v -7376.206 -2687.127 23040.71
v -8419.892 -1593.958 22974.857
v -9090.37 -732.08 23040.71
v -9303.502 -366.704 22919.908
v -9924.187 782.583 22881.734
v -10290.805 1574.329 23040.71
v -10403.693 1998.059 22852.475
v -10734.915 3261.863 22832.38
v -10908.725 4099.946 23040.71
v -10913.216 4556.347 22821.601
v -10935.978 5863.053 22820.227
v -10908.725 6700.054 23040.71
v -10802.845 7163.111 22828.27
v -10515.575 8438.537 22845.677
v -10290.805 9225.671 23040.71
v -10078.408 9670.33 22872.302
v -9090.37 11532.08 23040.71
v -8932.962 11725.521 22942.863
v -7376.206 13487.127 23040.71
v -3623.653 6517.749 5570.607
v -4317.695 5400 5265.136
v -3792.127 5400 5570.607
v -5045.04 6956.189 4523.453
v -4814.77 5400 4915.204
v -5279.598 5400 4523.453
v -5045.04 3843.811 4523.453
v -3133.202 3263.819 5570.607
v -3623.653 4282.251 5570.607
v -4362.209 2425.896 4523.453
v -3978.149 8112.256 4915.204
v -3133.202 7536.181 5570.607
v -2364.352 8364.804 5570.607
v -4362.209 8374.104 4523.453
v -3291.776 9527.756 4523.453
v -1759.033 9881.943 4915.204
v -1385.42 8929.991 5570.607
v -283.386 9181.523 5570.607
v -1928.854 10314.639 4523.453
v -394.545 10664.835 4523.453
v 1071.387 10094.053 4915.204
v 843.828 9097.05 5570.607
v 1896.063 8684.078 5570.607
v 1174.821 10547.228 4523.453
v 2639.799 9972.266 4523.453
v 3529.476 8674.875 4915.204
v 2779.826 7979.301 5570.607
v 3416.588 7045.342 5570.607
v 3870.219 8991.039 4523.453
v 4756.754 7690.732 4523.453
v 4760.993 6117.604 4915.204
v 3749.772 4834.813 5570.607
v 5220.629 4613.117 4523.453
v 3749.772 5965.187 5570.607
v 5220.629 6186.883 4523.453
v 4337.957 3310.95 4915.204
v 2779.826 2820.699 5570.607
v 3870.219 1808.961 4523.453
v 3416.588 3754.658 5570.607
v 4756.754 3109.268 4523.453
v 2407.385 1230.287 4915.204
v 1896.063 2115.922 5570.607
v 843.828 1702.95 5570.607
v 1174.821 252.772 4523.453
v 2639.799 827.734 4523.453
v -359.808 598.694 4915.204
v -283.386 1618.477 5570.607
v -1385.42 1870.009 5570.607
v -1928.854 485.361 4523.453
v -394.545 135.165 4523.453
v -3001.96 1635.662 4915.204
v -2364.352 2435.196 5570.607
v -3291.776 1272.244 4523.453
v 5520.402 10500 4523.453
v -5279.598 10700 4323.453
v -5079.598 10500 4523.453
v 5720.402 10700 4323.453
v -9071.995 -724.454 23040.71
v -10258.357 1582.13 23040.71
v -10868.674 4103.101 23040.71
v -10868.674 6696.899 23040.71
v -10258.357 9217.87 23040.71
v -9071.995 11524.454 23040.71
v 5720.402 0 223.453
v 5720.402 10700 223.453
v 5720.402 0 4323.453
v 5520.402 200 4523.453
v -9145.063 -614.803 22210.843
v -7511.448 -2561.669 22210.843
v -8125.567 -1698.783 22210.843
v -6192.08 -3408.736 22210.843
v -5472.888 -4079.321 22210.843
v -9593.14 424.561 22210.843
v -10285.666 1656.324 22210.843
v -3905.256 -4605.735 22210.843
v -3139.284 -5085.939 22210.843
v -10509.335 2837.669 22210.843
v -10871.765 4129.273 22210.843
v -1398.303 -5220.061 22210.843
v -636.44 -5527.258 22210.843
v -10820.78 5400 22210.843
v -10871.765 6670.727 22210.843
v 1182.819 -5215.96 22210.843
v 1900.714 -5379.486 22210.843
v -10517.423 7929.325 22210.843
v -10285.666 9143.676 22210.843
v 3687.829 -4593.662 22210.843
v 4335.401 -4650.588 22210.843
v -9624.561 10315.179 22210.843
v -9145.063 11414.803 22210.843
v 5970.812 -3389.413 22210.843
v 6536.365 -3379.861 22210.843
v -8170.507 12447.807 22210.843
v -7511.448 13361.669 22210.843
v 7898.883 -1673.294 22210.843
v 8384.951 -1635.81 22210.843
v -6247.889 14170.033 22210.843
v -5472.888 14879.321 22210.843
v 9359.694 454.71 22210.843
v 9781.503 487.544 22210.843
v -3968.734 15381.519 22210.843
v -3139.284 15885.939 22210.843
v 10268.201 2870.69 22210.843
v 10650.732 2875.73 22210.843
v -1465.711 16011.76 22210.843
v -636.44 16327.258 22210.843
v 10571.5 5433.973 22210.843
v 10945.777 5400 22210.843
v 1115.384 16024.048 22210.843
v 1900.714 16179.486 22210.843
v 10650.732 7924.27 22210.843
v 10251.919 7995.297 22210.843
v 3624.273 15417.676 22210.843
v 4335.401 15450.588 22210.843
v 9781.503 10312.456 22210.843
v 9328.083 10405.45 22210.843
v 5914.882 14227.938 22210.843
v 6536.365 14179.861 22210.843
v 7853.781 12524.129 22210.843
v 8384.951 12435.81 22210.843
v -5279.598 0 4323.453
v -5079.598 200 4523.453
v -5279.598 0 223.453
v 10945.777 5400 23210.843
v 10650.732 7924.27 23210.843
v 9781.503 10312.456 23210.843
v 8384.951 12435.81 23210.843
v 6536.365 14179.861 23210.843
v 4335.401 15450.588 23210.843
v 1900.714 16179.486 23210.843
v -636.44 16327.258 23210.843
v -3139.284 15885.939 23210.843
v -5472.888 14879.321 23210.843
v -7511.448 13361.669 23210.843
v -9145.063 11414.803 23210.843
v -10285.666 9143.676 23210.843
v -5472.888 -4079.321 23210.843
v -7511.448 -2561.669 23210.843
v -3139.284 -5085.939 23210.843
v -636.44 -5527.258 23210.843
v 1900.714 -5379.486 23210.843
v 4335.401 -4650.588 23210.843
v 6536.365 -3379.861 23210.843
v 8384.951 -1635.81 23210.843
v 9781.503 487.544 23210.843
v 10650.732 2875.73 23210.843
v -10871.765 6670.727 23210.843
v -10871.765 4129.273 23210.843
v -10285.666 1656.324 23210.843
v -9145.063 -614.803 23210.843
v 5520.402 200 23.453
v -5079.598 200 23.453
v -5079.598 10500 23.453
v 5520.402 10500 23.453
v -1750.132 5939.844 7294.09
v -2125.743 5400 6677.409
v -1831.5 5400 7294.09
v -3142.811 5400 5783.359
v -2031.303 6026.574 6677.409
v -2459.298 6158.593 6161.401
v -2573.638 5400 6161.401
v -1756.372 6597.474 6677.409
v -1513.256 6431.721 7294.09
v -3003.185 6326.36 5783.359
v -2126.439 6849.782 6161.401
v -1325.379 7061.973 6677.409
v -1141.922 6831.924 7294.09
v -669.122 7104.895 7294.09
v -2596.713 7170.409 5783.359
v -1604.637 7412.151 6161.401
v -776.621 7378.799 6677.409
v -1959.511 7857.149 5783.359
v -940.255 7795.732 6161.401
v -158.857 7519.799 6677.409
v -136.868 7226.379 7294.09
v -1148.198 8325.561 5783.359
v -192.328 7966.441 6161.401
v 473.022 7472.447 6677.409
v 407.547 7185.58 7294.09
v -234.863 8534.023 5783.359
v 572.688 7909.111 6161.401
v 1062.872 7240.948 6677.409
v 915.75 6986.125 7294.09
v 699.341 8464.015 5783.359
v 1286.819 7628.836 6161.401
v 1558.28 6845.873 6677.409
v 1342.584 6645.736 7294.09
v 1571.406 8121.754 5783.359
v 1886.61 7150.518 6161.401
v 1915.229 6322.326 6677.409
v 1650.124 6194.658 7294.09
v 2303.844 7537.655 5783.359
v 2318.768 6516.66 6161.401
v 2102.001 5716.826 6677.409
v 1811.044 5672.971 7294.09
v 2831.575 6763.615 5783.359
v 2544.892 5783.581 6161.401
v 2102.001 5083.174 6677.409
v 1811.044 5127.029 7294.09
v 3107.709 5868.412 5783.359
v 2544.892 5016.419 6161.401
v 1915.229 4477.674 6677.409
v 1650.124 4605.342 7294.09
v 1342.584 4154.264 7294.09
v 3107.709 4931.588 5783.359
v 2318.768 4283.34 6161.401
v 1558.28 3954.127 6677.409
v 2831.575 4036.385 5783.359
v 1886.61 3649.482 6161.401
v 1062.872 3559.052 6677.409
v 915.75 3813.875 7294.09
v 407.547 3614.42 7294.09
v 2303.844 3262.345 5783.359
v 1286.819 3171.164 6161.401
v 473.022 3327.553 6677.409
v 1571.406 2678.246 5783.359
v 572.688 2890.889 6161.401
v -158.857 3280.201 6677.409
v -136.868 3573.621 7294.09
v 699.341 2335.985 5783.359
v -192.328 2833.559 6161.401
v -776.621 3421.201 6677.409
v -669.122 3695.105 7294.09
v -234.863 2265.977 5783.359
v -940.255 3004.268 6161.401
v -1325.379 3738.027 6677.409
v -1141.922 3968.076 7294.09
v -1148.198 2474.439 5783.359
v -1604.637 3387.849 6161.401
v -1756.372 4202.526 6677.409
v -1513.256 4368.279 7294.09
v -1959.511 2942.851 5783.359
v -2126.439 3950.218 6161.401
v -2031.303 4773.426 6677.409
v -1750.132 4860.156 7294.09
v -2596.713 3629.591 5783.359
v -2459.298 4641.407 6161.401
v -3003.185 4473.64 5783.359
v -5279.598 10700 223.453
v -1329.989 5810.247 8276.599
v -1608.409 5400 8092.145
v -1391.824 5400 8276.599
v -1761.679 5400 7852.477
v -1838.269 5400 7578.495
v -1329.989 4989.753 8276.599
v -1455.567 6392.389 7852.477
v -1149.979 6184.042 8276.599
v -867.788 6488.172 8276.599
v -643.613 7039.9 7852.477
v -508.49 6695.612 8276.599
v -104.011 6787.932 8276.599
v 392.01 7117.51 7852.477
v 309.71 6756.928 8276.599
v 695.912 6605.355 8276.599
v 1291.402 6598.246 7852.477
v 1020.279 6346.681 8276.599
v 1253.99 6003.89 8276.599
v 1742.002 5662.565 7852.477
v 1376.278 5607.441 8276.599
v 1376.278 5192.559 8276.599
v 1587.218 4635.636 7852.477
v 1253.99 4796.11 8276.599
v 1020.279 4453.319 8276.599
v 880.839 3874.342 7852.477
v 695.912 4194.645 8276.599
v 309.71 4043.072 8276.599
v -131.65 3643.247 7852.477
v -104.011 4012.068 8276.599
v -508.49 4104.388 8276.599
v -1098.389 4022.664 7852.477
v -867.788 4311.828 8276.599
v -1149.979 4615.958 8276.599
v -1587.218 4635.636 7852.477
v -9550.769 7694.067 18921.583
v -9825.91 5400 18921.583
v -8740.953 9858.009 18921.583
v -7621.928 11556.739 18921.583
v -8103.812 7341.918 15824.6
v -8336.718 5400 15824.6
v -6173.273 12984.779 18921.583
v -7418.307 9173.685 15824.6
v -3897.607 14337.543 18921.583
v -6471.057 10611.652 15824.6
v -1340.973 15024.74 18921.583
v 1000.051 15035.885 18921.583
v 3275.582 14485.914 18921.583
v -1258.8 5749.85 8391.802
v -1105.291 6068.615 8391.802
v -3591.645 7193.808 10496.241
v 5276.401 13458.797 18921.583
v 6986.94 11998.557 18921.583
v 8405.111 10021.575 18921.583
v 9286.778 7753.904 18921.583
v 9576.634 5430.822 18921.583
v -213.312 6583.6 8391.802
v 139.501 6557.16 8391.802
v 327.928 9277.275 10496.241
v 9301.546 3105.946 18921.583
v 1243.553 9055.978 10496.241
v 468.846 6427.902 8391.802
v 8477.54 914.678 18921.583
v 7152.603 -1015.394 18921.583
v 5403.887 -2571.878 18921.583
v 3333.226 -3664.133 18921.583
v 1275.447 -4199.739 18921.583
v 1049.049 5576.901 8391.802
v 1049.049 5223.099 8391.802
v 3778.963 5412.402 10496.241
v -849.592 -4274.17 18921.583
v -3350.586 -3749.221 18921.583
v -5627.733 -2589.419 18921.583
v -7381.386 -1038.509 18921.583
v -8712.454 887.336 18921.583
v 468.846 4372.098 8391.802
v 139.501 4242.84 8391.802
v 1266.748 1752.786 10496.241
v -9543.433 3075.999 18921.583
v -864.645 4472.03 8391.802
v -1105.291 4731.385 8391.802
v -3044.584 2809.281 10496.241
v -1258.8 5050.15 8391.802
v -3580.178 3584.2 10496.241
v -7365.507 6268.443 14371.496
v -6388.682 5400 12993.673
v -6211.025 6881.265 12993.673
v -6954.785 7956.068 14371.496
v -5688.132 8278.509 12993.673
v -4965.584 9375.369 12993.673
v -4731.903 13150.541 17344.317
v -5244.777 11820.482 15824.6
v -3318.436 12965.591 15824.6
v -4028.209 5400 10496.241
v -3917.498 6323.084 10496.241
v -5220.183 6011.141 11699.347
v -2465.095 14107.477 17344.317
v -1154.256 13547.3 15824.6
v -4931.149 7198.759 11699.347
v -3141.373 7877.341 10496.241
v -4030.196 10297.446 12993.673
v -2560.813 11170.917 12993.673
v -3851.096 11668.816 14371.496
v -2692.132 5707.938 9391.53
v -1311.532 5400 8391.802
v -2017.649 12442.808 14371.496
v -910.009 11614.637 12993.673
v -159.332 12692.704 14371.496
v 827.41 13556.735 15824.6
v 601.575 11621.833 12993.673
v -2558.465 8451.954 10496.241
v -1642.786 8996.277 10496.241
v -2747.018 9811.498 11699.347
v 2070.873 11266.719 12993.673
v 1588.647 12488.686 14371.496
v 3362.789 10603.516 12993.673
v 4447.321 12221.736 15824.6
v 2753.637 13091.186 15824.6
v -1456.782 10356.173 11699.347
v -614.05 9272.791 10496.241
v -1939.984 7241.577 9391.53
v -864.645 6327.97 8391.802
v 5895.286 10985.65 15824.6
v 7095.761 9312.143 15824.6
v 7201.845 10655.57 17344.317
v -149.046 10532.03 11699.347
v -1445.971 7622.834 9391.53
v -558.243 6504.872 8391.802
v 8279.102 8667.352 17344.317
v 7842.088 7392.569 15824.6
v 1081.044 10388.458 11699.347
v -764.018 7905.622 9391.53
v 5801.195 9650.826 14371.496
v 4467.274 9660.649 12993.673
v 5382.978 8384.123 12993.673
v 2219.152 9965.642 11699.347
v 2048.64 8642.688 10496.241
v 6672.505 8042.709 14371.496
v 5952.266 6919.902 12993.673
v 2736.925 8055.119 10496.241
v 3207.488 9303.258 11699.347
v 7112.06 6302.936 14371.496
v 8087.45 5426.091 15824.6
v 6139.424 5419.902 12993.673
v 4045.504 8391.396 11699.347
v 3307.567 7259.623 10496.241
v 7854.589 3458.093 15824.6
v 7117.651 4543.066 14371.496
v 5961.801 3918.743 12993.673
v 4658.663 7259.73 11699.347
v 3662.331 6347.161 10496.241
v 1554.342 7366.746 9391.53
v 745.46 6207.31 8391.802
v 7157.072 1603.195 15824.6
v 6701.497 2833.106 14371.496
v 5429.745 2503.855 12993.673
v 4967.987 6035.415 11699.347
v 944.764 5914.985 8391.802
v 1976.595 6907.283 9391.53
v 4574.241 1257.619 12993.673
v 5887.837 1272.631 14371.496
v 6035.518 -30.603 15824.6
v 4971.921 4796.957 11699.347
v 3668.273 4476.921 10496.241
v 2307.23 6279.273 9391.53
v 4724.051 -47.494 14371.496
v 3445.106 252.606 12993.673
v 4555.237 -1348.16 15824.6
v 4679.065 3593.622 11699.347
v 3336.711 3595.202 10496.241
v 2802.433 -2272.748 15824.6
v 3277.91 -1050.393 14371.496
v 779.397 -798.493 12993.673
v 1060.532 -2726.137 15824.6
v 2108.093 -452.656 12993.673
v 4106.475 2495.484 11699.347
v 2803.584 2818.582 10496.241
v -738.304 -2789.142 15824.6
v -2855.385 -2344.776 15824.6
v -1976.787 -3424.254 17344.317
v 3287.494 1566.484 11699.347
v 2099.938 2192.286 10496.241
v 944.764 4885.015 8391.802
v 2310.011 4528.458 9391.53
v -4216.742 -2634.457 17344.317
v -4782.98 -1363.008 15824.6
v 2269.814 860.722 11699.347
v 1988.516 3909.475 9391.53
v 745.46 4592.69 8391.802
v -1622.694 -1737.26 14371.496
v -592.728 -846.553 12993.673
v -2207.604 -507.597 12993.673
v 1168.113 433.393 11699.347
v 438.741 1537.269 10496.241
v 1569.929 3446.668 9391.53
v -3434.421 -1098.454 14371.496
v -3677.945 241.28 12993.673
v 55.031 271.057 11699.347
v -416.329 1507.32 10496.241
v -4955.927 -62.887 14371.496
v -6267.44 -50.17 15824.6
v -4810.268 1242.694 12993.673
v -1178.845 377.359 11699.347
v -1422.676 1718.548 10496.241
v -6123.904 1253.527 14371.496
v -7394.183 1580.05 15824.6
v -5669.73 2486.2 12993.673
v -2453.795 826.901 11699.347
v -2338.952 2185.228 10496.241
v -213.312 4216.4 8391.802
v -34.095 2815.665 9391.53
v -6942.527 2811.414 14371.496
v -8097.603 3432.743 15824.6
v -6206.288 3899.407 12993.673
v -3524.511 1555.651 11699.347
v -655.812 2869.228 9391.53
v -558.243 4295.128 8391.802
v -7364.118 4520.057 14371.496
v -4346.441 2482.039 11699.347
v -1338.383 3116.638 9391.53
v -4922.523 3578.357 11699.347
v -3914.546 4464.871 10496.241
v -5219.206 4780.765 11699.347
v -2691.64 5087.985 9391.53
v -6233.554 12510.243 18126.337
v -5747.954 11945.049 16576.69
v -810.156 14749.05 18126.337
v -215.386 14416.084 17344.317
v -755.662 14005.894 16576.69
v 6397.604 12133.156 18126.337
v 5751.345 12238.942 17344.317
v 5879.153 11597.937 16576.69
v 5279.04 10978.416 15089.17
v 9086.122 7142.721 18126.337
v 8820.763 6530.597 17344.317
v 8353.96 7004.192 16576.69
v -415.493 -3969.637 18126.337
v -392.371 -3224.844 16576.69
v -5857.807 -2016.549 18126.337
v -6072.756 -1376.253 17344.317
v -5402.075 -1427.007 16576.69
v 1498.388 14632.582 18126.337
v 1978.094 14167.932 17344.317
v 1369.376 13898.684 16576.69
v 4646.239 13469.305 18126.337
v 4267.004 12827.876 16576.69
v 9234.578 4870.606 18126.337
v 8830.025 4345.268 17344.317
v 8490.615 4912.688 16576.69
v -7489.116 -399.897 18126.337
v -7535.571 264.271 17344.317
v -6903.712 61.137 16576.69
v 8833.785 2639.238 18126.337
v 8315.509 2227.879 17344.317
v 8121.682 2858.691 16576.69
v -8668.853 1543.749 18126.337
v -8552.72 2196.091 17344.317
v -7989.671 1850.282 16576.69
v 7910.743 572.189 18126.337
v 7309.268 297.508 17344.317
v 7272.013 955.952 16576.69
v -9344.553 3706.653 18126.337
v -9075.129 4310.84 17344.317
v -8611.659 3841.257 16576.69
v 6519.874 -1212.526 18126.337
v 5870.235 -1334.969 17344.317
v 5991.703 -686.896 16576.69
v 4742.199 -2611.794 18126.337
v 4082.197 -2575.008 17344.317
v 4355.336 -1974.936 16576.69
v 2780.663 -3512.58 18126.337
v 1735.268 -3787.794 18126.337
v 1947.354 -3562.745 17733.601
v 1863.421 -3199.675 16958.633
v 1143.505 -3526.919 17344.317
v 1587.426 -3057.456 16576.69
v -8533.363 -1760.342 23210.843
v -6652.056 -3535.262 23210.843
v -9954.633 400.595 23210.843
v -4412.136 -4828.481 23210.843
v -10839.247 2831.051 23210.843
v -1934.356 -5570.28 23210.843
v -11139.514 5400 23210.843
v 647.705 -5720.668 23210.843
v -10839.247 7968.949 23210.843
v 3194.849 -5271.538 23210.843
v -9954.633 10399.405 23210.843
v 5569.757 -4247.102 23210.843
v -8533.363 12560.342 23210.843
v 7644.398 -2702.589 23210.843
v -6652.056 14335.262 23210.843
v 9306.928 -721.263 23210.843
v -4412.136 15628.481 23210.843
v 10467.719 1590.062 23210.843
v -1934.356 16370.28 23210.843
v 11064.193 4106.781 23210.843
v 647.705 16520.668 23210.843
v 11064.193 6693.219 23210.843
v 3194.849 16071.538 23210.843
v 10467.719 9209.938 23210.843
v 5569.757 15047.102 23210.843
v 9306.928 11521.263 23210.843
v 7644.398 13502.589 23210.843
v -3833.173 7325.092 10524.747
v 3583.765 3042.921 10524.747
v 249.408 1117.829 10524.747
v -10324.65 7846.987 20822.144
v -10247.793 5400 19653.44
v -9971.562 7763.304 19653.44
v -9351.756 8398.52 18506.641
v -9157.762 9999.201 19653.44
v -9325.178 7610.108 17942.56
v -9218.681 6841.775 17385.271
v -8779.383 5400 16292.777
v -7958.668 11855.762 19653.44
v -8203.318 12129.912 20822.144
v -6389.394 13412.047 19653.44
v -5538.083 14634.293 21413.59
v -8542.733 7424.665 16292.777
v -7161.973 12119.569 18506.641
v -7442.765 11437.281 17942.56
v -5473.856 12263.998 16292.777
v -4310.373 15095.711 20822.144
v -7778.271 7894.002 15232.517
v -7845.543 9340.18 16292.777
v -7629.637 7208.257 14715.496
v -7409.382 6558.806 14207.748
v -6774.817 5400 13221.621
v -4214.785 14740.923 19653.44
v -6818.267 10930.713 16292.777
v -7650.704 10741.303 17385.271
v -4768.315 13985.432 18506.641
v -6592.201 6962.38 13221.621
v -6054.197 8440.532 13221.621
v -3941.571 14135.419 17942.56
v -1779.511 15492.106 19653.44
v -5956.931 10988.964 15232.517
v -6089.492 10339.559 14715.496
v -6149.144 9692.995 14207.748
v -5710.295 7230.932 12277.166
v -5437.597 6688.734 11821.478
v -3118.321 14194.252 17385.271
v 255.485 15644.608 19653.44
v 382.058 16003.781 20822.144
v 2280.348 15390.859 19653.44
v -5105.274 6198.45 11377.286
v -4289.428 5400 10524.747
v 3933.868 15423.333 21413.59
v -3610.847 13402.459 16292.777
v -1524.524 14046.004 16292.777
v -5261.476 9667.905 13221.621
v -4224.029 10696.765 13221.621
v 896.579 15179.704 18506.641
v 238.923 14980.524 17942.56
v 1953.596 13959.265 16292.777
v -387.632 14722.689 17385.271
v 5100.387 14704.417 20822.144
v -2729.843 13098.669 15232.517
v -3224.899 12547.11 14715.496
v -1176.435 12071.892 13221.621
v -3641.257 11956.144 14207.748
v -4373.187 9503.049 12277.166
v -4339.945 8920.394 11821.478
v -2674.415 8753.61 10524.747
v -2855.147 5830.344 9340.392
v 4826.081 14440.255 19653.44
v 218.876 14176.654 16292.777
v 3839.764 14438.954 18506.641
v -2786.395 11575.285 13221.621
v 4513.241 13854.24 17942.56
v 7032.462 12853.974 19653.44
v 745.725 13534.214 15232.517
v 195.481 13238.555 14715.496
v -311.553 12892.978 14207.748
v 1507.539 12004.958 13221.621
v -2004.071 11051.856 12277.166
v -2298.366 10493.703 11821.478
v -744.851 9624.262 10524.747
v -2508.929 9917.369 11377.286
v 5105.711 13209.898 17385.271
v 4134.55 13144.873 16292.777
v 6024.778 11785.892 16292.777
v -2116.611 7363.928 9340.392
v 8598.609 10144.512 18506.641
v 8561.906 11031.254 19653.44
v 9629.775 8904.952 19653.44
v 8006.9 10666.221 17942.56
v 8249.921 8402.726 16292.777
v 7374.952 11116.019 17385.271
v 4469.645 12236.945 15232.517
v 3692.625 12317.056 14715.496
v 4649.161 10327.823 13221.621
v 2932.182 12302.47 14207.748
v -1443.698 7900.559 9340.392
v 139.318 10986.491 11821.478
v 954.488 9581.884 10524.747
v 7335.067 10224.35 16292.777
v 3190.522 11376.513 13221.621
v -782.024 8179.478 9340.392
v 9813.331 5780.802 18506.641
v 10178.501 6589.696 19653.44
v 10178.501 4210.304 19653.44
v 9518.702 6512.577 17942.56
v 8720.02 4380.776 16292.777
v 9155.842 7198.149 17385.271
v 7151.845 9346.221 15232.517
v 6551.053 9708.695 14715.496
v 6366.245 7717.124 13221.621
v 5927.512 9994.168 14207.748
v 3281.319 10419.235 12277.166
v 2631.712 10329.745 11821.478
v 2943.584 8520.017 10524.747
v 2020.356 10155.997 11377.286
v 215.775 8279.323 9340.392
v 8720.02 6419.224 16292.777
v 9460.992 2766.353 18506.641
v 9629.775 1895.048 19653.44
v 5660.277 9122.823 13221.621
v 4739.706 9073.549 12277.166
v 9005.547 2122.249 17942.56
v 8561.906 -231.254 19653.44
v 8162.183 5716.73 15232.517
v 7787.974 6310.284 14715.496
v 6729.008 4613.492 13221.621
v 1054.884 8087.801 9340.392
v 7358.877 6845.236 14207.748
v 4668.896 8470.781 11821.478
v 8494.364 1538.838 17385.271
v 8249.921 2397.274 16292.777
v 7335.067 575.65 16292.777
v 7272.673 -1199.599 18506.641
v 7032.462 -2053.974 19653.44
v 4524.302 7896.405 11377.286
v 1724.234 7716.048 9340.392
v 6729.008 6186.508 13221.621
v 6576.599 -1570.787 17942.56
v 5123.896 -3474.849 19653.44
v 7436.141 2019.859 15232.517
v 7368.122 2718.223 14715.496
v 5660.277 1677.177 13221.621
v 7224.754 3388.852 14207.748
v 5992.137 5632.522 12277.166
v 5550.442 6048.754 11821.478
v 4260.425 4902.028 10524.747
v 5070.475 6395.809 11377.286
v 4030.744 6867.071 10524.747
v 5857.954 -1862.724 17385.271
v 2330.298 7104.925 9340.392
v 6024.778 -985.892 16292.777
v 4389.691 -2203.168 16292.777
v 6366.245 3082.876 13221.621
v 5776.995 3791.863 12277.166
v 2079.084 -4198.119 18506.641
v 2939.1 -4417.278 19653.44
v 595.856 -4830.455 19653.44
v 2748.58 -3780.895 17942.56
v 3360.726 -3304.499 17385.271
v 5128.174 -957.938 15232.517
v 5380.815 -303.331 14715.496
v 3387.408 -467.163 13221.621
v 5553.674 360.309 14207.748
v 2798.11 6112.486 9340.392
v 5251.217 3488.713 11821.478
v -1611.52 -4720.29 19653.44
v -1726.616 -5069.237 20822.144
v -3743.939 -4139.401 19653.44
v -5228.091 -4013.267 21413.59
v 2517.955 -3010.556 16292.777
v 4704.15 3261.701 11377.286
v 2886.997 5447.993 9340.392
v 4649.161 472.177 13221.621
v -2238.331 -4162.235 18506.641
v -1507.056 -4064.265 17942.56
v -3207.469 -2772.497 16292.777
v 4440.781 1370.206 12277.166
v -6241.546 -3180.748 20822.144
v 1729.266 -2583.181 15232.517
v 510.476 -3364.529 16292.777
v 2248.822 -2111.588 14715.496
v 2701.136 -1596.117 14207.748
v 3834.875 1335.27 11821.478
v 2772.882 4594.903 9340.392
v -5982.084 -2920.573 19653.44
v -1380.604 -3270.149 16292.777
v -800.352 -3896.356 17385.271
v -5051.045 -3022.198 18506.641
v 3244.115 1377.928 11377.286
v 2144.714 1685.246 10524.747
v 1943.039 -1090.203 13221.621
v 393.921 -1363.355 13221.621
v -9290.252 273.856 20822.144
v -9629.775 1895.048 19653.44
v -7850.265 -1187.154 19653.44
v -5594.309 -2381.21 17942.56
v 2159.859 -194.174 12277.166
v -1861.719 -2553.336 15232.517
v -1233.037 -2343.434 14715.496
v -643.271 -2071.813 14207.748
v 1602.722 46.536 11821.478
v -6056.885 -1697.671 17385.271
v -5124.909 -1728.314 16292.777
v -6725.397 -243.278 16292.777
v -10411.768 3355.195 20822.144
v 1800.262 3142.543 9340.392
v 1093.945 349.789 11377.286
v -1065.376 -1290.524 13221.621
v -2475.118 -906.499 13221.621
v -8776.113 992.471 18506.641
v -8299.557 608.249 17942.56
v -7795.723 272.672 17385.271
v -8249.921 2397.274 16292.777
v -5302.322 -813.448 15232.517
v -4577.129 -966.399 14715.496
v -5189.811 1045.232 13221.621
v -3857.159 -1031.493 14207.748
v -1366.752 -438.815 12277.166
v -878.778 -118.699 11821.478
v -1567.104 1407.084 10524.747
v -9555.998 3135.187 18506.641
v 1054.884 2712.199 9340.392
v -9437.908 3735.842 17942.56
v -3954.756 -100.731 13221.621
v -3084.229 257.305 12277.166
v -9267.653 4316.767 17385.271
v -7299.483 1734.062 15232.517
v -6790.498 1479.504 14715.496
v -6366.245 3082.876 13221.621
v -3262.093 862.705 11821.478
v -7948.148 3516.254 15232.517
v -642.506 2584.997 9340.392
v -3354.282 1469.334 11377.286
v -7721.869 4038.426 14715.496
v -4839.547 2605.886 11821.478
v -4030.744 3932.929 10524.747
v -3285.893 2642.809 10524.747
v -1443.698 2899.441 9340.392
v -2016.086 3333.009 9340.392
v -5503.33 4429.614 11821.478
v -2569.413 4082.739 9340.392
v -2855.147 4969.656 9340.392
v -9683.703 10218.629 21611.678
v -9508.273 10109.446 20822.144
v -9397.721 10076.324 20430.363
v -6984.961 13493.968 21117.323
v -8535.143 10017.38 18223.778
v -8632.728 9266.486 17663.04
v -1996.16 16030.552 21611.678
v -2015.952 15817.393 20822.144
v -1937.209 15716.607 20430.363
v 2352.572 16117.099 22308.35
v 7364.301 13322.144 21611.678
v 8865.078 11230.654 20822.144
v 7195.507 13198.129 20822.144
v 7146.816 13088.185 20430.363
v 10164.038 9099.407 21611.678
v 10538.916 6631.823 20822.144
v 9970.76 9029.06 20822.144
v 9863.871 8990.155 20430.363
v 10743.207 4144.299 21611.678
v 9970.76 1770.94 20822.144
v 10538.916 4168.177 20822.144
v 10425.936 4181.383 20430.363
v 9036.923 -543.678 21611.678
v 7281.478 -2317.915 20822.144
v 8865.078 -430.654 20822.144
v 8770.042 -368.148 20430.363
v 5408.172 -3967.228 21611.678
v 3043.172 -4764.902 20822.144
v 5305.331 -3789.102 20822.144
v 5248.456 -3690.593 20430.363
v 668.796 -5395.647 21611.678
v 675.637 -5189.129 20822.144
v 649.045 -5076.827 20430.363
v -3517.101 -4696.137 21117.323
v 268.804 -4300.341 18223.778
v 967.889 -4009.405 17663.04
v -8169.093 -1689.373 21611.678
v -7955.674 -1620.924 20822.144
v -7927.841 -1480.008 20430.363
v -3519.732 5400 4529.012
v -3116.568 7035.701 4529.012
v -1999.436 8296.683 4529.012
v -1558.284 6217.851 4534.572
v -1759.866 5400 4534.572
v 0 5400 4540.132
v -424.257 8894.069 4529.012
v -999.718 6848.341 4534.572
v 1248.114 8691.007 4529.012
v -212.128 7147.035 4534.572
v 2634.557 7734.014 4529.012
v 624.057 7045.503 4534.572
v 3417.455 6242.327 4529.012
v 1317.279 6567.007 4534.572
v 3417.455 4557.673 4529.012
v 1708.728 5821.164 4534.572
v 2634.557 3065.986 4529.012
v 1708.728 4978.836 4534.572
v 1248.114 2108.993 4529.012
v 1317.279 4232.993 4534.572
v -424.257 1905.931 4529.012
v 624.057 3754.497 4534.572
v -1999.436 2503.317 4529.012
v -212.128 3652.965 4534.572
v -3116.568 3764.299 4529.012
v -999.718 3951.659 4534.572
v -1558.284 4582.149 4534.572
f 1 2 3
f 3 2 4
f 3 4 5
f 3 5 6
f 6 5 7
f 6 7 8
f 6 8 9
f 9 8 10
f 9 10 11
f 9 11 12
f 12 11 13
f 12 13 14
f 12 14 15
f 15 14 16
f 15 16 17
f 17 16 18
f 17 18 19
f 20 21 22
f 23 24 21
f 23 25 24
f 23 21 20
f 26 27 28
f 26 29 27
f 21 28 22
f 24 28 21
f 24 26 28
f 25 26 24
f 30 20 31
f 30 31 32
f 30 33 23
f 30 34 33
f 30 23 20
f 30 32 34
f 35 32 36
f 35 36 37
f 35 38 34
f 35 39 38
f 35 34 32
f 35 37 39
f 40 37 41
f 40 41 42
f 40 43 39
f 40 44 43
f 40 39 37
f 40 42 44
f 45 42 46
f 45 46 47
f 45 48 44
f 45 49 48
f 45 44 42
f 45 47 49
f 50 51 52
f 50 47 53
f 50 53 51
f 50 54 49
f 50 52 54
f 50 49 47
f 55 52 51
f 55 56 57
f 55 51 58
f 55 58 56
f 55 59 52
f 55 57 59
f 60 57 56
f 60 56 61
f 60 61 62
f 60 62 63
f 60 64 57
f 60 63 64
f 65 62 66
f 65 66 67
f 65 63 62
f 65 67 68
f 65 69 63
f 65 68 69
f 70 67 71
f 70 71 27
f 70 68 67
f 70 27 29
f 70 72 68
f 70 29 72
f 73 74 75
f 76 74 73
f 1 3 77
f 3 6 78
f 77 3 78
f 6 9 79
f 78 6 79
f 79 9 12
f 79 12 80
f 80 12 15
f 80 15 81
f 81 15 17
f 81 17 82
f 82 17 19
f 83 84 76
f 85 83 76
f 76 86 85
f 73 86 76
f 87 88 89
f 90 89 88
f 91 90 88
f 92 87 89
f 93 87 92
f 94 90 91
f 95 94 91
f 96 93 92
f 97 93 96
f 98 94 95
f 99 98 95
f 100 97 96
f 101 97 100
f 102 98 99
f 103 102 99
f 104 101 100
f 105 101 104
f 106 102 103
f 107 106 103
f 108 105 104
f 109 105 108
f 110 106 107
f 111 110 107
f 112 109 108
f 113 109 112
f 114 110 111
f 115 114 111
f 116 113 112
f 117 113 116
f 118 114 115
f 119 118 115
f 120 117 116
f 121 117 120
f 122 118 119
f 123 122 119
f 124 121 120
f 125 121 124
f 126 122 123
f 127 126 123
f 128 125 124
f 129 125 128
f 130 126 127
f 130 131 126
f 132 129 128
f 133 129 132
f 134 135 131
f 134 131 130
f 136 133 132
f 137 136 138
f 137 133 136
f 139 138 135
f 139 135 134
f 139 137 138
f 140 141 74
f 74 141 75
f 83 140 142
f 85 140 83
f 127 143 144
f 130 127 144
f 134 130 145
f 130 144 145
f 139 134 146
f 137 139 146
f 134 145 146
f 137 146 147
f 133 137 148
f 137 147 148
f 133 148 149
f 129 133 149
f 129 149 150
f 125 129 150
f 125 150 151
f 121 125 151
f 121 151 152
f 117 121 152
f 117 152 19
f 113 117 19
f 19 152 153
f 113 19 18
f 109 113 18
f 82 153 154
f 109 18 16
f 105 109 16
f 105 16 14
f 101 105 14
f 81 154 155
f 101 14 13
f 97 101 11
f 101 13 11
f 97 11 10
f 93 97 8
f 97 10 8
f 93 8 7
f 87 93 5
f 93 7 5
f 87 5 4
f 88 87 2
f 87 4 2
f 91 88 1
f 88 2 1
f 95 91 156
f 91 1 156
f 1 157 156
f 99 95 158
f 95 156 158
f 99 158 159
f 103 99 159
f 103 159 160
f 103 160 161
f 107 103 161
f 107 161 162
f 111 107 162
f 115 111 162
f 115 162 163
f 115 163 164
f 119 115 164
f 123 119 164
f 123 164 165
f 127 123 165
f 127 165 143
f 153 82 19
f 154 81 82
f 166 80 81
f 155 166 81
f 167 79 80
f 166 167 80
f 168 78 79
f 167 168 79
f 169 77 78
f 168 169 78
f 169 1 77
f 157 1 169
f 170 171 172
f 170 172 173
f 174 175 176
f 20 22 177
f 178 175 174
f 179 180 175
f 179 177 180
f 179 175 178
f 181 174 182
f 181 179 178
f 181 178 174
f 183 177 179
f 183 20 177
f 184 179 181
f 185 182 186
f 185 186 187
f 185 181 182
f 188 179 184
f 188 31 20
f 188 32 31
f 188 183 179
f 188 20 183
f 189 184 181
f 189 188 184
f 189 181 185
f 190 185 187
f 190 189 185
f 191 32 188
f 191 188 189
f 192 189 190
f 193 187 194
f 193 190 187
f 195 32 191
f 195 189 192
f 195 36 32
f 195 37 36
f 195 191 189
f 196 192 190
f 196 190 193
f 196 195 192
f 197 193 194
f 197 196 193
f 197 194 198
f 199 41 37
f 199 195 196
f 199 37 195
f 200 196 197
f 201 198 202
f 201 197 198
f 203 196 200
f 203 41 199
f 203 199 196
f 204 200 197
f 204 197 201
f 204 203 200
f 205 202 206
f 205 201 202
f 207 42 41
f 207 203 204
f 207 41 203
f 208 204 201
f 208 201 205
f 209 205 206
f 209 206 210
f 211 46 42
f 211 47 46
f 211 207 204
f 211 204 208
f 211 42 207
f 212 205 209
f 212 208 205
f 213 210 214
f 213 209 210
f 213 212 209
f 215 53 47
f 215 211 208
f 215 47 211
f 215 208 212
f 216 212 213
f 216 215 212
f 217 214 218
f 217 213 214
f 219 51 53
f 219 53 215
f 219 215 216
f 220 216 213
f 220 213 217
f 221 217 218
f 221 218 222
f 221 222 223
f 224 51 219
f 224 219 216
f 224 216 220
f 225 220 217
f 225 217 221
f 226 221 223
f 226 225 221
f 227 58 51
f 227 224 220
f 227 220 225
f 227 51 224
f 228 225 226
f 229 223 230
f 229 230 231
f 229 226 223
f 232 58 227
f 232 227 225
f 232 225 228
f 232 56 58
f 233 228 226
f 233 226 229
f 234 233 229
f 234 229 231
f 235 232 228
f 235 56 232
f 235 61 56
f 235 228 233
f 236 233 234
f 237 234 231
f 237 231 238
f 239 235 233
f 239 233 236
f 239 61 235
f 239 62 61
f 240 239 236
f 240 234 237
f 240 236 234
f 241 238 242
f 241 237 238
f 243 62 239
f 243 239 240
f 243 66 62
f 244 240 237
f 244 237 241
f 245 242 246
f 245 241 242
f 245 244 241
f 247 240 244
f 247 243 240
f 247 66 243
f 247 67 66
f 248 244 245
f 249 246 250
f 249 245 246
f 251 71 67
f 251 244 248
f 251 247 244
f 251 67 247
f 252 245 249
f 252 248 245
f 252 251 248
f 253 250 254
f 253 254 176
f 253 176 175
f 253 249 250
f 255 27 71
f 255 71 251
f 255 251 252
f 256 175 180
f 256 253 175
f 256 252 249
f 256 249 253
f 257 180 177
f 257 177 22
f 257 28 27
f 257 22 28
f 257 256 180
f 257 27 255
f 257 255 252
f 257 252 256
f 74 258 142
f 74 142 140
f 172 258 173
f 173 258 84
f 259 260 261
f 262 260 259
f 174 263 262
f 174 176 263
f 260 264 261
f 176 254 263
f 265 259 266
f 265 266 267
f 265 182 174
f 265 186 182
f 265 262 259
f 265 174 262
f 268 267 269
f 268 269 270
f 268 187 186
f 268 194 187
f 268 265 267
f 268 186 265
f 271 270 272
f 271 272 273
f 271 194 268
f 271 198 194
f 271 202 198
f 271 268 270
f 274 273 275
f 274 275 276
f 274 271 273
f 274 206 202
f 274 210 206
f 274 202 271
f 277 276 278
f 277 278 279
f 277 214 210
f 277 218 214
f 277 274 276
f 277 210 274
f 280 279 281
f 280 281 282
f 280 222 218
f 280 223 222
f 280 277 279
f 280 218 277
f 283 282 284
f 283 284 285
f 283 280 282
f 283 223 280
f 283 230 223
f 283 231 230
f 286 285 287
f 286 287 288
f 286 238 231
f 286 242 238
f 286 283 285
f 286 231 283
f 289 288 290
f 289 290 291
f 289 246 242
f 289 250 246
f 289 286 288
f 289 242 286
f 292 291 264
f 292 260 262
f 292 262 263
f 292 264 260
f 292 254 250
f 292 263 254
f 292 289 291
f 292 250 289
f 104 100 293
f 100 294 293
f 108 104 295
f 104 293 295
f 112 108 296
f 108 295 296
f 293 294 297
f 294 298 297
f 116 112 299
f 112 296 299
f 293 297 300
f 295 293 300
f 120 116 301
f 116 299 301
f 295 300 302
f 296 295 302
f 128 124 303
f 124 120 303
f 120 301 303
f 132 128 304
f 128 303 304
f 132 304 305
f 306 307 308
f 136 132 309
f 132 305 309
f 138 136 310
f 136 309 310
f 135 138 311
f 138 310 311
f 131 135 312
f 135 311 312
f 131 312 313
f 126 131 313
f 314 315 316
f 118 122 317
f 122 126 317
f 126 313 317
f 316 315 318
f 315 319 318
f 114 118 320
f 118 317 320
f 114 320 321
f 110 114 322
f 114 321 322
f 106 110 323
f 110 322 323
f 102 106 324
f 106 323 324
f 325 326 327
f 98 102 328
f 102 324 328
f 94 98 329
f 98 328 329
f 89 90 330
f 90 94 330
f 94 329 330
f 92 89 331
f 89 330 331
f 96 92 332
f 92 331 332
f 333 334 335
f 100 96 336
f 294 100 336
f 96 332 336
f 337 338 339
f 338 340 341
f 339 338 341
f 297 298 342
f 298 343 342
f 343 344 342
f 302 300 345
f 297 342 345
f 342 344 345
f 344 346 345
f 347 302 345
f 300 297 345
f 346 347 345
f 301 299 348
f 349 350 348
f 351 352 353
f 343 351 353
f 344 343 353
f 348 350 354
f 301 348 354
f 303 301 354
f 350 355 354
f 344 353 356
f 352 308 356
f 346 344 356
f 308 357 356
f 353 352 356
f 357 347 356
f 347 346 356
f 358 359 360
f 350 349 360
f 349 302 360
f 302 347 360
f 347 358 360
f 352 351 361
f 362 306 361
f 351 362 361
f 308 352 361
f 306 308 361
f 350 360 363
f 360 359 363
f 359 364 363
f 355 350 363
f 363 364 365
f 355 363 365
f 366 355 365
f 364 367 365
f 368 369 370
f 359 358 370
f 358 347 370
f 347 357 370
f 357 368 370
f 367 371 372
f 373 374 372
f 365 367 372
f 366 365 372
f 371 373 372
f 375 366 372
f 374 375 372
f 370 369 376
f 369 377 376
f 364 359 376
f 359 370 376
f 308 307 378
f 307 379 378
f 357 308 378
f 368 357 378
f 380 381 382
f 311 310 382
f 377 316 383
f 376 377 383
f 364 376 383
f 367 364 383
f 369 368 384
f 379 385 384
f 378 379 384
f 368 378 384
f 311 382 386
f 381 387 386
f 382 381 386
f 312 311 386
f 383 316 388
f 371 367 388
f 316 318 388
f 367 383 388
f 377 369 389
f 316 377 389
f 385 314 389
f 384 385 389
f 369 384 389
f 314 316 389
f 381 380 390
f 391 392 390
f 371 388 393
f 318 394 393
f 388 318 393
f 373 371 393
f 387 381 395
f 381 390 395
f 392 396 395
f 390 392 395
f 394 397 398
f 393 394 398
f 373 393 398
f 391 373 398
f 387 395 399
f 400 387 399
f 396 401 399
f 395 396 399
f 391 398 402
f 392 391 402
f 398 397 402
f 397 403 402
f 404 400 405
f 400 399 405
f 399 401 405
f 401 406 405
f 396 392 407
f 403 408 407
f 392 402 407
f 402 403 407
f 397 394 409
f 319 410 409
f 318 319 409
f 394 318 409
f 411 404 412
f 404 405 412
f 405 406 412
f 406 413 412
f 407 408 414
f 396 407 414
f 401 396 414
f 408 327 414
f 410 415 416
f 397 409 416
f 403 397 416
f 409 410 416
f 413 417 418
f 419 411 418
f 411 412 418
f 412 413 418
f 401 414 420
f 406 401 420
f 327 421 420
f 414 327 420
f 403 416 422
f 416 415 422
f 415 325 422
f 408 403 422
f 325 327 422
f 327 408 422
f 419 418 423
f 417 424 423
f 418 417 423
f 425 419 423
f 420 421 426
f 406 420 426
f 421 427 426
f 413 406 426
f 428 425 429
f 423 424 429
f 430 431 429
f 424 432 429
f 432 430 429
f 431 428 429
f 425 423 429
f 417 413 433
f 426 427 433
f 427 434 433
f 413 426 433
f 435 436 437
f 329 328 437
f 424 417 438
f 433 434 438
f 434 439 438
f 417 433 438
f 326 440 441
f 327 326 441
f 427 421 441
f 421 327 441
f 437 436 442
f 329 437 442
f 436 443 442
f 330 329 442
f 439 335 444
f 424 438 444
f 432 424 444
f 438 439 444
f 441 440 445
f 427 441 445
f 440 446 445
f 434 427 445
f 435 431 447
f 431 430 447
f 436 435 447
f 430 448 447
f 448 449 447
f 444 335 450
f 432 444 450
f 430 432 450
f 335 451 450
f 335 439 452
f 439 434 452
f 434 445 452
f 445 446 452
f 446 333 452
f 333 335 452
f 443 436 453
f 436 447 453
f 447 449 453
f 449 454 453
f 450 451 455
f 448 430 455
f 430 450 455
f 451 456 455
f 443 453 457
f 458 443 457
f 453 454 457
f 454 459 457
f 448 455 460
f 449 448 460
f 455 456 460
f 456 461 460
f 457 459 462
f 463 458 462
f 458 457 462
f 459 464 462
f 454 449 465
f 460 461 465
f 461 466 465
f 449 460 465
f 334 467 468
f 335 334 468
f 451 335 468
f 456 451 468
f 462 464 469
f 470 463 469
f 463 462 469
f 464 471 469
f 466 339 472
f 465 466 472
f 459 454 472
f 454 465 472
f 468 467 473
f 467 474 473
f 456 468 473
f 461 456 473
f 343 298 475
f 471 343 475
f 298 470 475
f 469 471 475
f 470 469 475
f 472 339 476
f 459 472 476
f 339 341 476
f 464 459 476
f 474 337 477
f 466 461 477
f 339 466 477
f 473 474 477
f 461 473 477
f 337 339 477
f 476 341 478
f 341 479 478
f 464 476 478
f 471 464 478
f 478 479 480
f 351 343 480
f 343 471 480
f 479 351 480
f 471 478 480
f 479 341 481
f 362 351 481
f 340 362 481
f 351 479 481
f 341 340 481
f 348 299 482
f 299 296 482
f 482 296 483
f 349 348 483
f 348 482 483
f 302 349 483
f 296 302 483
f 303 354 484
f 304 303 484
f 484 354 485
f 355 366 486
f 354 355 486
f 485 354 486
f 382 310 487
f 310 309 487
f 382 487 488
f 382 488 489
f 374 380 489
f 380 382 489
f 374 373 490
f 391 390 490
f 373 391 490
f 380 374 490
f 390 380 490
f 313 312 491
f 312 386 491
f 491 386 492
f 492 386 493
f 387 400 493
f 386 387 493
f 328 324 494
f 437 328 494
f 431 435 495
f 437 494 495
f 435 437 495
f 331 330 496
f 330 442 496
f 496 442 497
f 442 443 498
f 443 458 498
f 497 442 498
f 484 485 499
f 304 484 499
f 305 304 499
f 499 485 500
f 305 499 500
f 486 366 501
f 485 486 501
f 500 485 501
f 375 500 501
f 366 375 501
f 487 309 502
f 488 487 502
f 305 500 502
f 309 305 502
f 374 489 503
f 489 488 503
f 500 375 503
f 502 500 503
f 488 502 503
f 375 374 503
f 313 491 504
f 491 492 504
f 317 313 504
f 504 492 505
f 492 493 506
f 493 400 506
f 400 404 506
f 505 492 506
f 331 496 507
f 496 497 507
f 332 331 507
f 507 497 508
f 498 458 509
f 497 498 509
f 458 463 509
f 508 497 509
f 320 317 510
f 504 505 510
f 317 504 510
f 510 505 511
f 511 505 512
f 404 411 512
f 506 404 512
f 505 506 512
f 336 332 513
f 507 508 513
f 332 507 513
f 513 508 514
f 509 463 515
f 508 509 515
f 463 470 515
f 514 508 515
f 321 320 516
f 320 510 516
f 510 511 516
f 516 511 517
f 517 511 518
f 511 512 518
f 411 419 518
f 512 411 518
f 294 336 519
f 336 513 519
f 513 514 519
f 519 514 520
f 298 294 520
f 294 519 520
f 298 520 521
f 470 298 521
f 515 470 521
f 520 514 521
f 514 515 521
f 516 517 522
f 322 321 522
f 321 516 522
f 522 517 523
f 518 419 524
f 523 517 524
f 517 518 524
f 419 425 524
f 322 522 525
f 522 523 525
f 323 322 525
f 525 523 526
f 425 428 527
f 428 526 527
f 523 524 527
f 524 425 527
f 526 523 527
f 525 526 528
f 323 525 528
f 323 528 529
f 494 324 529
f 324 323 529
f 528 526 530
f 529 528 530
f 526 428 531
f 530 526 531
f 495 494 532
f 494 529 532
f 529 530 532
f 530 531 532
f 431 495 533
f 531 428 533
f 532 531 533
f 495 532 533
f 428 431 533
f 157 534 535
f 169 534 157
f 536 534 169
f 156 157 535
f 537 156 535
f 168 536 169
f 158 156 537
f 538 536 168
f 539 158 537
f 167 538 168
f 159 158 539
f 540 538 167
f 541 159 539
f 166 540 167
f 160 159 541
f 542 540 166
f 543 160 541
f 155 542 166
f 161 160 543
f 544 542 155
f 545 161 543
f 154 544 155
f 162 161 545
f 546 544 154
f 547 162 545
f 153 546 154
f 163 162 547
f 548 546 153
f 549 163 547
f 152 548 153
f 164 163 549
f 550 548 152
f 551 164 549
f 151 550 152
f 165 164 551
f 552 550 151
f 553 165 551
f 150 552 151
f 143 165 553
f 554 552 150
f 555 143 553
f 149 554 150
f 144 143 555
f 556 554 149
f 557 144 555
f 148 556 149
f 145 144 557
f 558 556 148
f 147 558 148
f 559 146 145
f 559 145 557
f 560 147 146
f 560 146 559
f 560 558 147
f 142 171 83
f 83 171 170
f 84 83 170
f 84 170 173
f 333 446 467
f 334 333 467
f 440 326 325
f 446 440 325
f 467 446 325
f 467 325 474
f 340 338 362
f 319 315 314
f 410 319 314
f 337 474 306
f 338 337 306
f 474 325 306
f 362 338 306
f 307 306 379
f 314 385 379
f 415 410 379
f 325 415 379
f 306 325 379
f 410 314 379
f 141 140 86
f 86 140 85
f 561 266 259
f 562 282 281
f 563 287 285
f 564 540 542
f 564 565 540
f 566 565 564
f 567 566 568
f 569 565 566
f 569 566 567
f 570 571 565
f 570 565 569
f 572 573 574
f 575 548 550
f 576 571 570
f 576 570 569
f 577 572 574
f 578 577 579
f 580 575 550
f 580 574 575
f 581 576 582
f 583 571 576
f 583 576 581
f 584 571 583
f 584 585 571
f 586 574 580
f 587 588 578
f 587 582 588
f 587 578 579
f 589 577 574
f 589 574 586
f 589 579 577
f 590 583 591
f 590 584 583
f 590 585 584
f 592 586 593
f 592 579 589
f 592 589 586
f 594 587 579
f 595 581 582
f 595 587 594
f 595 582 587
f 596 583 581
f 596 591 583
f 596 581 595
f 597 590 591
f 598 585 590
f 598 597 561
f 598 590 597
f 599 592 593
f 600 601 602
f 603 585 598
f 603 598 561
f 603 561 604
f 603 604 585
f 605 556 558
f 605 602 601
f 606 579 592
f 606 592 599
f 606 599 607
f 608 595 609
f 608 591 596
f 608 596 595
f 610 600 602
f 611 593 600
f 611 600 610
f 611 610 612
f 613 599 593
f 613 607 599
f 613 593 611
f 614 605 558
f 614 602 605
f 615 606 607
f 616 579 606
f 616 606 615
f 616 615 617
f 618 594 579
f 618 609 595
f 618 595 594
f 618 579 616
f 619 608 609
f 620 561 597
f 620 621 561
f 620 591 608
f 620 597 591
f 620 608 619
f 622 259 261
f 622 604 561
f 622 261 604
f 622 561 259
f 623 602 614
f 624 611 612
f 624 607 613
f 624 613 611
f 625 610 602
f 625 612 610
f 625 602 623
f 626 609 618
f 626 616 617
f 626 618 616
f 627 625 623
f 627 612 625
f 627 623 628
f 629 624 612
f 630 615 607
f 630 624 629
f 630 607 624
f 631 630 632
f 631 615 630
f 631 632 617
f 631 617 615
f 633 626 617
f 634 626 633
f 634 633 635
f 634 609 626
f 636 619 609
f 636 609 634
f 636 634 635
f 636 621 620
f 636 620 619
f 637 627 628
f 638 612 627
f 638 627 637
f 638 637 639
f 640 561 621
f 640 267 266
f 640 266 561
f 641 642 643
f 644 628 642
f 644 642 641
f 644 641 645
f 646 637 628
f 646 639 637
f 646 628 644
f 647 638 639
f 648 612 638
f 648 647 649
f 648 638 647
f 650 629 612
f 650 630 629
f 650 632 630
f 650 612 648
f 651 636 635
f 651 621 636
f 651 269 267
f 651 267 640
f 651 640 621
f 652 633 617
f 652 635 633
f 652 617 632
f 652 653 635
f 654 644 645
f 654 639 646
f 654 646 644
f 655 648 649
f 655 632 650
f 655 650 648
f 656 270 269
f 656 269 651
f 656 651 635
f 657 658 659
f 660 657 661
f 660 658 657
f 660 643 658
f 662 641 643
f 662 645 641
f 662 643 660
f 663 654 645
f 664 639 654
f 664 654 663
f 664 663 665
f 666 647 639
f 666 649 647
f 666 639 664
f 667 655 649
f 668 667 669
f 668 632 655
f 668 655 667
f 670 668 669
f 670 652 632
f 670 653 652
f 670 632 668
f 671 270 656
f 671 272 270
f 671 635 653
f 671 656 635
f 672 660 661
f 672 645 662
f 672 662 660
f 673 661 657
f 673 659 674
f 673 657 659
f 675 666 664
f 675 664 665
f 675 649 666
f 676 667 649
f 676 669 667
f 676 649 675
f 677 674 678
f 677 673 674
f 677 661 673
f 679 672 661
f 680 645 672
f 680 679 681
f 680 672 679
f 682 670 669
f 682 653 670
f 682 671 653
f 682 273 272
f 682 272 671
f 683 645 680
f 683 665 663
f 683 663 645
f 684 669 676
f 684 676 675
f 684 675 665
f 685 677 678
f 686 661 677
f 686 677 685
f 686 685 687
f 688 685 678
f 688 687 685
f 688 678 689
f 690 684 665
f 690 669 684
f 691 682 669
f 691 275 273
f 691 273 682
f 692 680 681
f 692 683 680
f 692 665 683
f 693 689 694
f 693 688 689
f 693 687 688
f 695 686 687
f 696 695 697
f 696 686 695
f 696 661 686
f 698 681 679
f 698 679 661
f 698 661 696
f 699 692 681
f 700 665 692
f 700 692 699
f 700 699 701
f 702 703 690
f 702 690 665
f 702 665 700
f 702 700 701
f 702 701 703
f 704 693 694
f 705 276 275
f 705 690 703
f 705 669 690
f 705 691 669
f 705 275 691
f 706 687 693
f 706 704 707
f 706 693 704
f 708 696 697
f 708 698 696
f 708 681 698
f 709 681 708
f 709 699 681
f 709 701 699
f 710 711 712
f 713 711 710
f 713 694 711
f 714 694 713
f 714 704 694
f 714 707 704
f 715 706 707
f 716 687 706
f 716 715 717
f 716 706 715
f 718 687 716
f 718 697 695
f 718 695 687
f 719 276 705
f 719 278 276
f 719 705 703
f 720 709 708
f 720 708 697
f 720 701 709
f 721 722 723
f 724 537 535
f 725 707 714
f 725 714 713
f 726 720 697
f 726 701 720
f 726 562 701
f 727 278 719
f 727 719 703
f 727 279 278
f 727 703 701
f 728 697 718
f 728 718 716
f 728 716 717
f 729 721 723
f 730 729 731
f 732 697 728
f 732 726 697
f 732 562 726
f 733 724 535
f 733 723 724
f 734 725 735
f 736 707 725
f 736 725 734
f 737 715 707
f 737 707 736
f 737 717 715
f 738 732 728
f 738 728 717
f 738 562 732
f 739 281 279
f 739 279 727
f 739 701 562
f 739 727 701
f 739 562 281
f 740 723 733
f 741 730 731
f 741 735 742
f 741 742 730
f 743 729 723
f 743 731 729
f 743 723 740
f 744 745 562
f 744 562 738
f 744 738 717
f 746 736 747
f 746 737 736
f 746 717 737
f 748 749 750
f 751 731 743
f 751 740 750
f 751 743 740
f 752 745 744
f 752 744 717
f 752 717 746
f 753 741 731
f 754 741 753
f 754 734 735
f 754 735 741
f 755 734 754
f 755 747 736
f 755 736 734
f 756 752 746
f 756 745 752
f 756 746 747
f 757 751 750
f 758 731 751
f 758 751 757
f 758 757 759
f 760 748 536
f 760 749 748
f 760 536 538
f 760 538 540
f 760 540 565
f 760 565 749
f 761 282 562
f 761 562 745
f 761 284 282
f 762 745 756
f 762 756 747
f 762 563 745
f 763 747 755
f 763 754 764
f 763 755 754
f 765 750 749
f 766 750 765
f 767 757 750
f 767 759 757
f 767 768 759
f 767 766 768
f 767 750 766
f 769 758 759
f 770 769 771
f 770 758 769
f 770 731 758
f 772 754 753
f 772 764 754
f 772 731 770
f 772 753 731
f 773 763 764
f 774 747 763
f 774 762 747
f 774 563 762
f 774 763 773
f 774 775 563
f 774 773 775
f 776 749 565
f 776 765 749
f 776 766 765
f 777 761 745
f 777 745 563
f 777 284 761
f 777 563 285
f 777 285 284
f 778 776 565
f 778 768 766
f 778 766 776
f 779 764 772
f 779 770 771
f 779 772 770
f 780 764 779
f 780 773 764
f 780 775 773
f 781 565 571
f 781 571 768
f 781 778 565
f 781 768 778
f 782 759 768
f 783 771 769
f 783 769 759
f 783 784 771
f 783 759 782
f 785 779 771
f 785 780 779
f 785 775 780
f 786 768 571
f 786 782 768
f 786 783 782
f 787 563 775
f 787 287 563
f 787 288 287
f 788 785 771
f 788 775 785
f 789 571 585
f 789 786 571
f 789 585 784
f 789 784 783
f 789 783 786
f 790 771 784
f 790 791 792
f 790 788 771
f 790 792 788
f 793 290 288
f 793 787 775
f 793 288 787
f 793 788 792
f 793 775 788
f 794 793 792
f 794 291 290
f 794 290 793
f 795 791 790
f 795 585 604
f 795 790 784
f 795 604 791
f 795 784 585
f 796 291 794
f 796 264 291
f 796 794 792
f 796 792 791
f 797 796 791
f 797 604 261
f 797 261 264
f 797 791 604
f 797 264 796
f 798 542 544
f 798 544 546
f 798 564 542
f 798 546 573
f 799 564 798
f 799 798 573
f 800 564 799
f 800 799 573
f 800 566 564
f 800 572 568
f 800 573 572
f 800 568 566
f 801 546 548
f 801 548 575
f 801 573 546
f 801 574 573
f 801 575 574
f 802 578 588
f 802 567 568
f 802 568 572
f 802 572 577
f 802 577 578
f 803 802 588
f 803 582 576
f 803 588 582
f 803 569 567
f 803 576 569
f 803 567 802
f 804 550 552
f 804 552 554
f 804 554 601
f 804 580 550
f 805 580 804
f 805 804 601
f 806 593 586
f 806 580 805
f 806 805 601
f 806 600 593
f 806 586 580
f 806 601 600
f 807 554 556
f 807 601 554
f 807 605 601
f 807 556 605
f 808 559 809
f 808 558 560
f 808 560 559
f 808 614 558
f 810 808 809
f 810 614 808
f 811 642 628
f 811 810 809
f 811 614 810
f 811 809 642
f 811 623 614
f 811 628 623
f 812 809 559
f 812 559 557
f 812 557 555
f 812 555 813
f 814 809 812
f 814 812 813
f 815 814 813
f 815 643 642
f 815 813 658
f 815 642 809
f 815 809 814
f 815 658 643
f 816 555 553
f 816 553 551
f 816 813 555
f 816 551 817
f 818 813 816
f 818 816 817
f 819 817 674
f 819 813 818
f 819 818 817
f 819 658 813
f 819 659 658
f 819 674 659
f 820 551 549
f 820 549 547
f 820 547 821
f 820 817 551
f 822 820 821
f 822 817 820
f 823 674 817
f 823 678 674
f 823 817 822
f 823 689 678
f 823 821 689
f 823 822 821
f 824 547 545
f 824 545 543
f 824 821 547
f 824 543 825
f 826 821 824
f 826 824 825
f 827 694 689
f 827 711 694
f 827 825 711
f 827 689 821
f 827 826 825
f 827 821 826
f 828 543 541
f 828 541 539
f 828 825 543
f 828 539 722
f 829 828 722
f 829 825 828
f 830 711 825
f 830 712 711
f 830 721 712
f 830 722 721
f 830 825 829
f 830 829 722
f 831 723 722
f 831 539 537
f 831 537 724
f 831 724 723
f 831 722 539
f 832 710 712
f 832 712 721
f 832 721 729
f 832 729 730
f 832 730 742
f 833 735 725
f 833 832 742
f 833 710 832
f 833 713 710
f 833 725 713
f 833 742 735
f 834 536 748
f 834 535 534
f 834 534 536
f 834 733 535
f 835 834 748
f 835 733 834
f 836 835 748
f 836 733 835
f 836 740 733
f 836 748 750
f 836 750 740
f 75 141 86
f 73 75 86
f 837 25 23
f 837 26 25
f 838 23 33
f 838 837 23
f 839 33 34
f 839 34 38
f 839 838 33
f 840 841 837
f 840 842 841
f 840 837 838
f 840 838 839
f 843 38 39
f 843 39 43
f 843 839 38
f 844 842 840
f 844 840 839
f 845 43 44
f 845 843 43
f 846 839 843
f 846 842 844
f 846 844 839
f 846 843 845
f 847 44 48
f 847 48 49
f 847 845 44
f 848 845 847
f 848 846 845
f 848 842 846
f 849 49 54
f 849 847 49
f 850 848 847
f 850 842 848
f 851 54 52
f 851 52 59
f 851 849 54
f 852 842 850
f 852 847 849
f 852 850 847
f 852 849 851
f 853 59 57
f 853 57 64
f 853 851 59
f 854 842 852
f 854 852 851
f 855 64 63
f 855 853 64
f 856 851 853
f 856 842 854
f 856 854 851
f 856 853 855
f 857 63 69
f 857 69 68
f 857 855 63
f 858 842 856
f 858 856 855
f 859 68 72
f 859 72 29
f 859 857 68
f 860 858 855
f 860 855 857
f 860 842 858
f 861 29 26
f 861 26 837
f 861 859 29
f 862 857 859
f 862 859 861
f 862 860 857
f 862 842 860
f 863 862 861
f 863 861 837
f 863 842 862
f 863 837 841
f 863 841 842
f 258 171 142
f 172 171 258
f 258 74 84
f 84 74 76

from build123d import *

# Parameters (mm, degrees)
F0_W     = 11000
F0_H     = 4500
F1_DEPTH = 10700
F7_R     = 10945.7766919198
F8_DEPTH = 1000
F9_SIZE  = 200
F10_SIZE = 200


with BuildPart() as f1:
    # F0 (on Front) → F1 (new body)
    with BuildSketch(Plane.XZ):
        with Locations((220.401763916, 2273.4528705478)):
            Rectangle(F0_W, F0_H)
    extrude(amount=-F1_DEPTH)

    # F9
    f9_edges = [f1.edges().sort_by_distance(p)[0] for p in [
        (5720.401764, 5350, 4523.452871),
        (220.401764, 0, 4523.452871),
        (220.401764, 10700, 4523.452871),
        (-5279.598236, 5350, 4523.452871),
    ]]
    chamfer(f9_edges, length=F9_SIZE)

    # F10
    f10_edges = [f1.edges().sort_by_distance(p)[0] for p in [
        (5720.401764, 5350, 23.452871),
        (220.401764, 10700, 23.452871),
        (-5279.598236, 5350, 23.452871),
        (220.401764, 0, 23.452871),
    ]]
    chamfer(f10_edges, length=F10_SIZE)


with BuildPart() as f4:
    # F3 (on offset) → F4 (revolve)
    with BuildSketch(Plane.XZ.offset(-5400)):
        with BuildLine():
            Line((0, 23210.8431816101), (-11139.5139415628, 23210.8431816101))
            ThreePointArc((-11139.5139415628, 23210.8431816101), (-7840.9916650951, 14715.4963302233), (-1391.8237686157, 8276.5988487641))
            ThreePointArc((-1391.8237686157, 8276.5988487641), (-695.9118843079, 8189.8528057998), (0, 8276.5988487641))
            Line((0, 8276.5988487641), (0, 23210.8431816101))
        make_face()
        with BuildLine():
            ThreePointArc((0, 8276.5988487641), (-695.9118843079, 8189.8528057998), (-1391.8237686157, 8276.5988487641))
            ThreePointArc((-1391.8237686157, 8276.5988487641), (-1761.6785391899, 7852.4773028307), (-1831.4999341965, 7294.0897941589))
            ThreePointArc((-1831.4999341965, 7294.0897941589), (-2573.6378349626, 6161.4008029566), (-3792.1268939972, 5570.6069069509))
            ThreePointArc((-3792.1268939972, 5570.6069069509), (-4570.0340406157, 5095.5701119331), (-5279.598236084, 4523.4528705478))
            Line((-5279.598236084, 4523.4528705478), (0, 4540.1316756694))
            Line((0, 4540.1316756695), (0, 8276.5988487641))
        make_face()
    revolve(axis=Axis((0, 5400, 11608.5826453753), (0, 0, -1)))

    # F5 (on offset) → F6 (revolve, cut)
    with BuildSketch(Plane.XZ.offset(-5400)):
        with BuildLine():
            Line((-1311.5319013596, 8391.8018341064), (-124.6130913496, 8391.8018341064))
            Line((-124.6130913496, 8391.8018341064), (-124.6130913496, 23040.7104492188))
            Line((-124.6130913496, 23040.7104492188), (-10986.8049621582, 23040.7104492188))
            ThreePointArc((-10986.8049621582, 23040.7104492187), (-7653.9646206582, 14722.3722687418), (-1311.5319013596, 8391.8018341064))
        make_face()
    revolve(axis=Axis((-124.6130913496, 5400, 15716.2561416626), (0, 0, -1)), mode=Mode.SUBTRACT)

    # F7 (on face) → F8 (cut)
    with BuildSketch(Plane.XY.offset(23210.8431816101)):
        with Locations((0, 5400)):
            Circle(F7_R)
    extrude(amount=-F8_DEPTH, mode=Mode.SUBTRACT)


solid = Compound([f1.part, f4.part])
